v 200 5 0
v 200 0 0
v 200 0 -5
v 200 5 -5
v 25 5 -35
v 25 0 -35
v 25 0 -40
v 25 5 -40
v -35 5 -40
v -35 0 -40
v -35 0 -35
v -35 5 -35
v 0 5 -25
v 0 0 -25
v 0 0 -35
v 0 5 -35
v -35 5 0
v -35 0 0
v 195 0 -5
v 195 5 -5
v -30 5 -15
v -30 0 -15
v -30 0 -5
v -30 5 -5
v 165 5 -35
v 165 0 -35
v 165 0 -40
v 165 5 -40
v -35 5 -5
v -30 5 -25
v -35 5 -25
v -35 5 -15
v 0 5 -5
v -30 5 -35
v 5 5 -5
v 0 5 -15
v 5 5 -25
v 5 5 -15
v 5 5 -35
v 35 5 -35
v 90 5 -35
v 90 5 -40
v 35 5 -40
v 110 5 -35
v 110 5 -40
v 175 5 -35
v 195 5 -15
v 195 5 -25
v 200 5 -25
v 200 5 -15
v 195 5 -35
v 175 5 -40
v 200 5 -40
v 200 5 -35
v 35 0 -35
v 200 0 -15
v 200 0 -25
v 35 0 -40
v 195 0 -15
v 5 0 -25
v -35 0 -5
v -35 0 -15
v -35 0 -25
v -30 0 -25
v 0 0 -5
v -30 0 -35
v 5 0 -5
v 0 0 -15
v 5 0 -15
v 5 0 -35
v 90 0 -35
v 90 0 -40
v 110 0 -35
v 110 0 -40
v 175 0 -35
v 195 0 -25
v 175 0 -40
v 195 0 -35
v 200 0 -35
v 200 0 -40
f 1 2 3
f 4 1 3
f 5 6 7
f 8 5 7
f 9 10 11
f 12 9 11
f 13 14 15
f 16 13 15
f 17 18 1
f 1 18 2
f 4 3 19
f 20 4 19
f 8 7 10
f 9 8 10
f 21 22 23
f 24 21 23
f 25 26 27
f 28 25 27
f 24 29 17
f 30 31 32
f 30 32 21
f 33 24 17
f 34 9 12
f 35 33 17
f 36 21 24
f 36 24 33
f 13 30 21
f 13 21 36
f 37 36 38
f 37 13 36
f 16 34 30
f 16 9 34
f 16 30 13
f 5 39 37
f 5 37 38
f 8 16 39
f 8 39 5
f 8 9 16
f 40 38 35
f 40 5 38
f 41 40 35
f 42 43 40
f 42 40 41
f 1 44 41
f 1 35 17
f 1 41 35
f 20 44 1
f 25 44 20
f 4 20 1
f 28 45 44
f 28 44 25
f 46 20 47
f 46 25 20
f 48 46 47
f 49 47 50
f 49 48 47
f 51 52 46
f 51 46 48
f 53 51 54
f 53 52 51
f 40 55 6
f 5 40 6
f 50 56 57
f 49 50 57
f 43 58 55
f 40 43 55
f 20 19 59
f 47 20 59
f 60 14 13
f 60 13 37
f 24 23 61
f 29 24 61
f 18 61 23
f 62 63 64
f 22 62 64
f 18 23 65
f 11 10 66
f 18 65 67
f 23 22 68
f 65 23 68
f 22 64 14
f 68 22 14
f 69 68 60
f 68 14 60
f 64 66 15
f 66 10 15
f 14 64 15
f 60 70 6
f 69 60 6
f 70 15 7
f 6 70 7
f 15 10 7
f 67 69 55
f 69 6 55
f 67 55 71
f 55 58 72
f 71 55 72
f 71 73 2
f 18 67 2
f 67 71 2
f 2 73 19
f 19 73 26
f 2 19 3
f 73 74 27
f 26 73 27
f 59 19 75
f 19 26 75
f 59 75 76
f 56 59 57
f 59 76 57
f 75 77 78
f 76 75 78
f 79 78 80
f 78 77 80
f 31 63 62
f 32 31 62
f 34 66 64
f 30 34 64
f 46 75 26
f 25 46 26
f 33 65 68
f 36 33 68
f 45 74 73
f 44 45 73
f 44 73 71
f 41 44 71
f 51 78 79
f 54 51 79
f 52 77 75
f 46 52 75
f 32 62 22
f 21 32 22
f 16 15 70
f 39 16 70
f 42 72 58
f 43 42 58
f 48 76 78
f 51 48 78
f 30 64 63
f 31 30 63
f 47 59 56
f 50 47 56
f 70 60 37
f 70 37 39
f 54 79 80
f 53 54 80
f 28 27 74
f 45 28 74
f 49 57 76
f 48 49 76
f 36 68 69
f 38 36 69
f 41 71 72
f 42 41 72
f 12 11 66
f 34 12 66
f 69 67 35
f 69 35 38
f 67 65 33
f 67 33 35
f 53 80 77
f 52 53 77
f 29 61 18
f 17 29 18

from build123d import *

# Parameters (mm, degrees)
SKETCH_1_W      = 5
SKETCH_1_H      = 10
EXTRUDE_1_DEPTH = 5


with BuildPart() as part:
    # 草图1 → 凸台-拉伸1 (new body)
    with BuildSketch(Plane(origin=(0, 0, 0), x_dir=(1, 0, 0), z_dir=(0, 1, 0))):
        Polygon((0, 0), (200, 0), (200, 5), (195, 5), (195, 15), (200, 15), (200, 25), (195, 25), (195, 35), (200, 35), (200, 40), (175, 40), (175, 35), (165, 35), (165, 40), (110, 40), (110, 35), (90, 35), (90, 40), (35, 40), (35, 35), (25, 35), (25, 40), (0, 40), (-35, 40), (-35, 35), (-30, 35), (-30, 25), (-35, 25), (-35, 15), (-30, 15), (-30, 5), (-35, 5), (-35, 0), align=None)
        with Locations((2.5, 30)):
            Rectangle(SKETCH_1_W, SKETCH_1_H, mode=Mode.SUBTRACT)
        with Locations((2.5, 10)):
            Rectangle(SKETCH_1_W, SKETCH_1_H, mode=Mode.SUBTRACT)
    extrude(amount=EXTRUDE_1_DEPTH)


solid = part.part
